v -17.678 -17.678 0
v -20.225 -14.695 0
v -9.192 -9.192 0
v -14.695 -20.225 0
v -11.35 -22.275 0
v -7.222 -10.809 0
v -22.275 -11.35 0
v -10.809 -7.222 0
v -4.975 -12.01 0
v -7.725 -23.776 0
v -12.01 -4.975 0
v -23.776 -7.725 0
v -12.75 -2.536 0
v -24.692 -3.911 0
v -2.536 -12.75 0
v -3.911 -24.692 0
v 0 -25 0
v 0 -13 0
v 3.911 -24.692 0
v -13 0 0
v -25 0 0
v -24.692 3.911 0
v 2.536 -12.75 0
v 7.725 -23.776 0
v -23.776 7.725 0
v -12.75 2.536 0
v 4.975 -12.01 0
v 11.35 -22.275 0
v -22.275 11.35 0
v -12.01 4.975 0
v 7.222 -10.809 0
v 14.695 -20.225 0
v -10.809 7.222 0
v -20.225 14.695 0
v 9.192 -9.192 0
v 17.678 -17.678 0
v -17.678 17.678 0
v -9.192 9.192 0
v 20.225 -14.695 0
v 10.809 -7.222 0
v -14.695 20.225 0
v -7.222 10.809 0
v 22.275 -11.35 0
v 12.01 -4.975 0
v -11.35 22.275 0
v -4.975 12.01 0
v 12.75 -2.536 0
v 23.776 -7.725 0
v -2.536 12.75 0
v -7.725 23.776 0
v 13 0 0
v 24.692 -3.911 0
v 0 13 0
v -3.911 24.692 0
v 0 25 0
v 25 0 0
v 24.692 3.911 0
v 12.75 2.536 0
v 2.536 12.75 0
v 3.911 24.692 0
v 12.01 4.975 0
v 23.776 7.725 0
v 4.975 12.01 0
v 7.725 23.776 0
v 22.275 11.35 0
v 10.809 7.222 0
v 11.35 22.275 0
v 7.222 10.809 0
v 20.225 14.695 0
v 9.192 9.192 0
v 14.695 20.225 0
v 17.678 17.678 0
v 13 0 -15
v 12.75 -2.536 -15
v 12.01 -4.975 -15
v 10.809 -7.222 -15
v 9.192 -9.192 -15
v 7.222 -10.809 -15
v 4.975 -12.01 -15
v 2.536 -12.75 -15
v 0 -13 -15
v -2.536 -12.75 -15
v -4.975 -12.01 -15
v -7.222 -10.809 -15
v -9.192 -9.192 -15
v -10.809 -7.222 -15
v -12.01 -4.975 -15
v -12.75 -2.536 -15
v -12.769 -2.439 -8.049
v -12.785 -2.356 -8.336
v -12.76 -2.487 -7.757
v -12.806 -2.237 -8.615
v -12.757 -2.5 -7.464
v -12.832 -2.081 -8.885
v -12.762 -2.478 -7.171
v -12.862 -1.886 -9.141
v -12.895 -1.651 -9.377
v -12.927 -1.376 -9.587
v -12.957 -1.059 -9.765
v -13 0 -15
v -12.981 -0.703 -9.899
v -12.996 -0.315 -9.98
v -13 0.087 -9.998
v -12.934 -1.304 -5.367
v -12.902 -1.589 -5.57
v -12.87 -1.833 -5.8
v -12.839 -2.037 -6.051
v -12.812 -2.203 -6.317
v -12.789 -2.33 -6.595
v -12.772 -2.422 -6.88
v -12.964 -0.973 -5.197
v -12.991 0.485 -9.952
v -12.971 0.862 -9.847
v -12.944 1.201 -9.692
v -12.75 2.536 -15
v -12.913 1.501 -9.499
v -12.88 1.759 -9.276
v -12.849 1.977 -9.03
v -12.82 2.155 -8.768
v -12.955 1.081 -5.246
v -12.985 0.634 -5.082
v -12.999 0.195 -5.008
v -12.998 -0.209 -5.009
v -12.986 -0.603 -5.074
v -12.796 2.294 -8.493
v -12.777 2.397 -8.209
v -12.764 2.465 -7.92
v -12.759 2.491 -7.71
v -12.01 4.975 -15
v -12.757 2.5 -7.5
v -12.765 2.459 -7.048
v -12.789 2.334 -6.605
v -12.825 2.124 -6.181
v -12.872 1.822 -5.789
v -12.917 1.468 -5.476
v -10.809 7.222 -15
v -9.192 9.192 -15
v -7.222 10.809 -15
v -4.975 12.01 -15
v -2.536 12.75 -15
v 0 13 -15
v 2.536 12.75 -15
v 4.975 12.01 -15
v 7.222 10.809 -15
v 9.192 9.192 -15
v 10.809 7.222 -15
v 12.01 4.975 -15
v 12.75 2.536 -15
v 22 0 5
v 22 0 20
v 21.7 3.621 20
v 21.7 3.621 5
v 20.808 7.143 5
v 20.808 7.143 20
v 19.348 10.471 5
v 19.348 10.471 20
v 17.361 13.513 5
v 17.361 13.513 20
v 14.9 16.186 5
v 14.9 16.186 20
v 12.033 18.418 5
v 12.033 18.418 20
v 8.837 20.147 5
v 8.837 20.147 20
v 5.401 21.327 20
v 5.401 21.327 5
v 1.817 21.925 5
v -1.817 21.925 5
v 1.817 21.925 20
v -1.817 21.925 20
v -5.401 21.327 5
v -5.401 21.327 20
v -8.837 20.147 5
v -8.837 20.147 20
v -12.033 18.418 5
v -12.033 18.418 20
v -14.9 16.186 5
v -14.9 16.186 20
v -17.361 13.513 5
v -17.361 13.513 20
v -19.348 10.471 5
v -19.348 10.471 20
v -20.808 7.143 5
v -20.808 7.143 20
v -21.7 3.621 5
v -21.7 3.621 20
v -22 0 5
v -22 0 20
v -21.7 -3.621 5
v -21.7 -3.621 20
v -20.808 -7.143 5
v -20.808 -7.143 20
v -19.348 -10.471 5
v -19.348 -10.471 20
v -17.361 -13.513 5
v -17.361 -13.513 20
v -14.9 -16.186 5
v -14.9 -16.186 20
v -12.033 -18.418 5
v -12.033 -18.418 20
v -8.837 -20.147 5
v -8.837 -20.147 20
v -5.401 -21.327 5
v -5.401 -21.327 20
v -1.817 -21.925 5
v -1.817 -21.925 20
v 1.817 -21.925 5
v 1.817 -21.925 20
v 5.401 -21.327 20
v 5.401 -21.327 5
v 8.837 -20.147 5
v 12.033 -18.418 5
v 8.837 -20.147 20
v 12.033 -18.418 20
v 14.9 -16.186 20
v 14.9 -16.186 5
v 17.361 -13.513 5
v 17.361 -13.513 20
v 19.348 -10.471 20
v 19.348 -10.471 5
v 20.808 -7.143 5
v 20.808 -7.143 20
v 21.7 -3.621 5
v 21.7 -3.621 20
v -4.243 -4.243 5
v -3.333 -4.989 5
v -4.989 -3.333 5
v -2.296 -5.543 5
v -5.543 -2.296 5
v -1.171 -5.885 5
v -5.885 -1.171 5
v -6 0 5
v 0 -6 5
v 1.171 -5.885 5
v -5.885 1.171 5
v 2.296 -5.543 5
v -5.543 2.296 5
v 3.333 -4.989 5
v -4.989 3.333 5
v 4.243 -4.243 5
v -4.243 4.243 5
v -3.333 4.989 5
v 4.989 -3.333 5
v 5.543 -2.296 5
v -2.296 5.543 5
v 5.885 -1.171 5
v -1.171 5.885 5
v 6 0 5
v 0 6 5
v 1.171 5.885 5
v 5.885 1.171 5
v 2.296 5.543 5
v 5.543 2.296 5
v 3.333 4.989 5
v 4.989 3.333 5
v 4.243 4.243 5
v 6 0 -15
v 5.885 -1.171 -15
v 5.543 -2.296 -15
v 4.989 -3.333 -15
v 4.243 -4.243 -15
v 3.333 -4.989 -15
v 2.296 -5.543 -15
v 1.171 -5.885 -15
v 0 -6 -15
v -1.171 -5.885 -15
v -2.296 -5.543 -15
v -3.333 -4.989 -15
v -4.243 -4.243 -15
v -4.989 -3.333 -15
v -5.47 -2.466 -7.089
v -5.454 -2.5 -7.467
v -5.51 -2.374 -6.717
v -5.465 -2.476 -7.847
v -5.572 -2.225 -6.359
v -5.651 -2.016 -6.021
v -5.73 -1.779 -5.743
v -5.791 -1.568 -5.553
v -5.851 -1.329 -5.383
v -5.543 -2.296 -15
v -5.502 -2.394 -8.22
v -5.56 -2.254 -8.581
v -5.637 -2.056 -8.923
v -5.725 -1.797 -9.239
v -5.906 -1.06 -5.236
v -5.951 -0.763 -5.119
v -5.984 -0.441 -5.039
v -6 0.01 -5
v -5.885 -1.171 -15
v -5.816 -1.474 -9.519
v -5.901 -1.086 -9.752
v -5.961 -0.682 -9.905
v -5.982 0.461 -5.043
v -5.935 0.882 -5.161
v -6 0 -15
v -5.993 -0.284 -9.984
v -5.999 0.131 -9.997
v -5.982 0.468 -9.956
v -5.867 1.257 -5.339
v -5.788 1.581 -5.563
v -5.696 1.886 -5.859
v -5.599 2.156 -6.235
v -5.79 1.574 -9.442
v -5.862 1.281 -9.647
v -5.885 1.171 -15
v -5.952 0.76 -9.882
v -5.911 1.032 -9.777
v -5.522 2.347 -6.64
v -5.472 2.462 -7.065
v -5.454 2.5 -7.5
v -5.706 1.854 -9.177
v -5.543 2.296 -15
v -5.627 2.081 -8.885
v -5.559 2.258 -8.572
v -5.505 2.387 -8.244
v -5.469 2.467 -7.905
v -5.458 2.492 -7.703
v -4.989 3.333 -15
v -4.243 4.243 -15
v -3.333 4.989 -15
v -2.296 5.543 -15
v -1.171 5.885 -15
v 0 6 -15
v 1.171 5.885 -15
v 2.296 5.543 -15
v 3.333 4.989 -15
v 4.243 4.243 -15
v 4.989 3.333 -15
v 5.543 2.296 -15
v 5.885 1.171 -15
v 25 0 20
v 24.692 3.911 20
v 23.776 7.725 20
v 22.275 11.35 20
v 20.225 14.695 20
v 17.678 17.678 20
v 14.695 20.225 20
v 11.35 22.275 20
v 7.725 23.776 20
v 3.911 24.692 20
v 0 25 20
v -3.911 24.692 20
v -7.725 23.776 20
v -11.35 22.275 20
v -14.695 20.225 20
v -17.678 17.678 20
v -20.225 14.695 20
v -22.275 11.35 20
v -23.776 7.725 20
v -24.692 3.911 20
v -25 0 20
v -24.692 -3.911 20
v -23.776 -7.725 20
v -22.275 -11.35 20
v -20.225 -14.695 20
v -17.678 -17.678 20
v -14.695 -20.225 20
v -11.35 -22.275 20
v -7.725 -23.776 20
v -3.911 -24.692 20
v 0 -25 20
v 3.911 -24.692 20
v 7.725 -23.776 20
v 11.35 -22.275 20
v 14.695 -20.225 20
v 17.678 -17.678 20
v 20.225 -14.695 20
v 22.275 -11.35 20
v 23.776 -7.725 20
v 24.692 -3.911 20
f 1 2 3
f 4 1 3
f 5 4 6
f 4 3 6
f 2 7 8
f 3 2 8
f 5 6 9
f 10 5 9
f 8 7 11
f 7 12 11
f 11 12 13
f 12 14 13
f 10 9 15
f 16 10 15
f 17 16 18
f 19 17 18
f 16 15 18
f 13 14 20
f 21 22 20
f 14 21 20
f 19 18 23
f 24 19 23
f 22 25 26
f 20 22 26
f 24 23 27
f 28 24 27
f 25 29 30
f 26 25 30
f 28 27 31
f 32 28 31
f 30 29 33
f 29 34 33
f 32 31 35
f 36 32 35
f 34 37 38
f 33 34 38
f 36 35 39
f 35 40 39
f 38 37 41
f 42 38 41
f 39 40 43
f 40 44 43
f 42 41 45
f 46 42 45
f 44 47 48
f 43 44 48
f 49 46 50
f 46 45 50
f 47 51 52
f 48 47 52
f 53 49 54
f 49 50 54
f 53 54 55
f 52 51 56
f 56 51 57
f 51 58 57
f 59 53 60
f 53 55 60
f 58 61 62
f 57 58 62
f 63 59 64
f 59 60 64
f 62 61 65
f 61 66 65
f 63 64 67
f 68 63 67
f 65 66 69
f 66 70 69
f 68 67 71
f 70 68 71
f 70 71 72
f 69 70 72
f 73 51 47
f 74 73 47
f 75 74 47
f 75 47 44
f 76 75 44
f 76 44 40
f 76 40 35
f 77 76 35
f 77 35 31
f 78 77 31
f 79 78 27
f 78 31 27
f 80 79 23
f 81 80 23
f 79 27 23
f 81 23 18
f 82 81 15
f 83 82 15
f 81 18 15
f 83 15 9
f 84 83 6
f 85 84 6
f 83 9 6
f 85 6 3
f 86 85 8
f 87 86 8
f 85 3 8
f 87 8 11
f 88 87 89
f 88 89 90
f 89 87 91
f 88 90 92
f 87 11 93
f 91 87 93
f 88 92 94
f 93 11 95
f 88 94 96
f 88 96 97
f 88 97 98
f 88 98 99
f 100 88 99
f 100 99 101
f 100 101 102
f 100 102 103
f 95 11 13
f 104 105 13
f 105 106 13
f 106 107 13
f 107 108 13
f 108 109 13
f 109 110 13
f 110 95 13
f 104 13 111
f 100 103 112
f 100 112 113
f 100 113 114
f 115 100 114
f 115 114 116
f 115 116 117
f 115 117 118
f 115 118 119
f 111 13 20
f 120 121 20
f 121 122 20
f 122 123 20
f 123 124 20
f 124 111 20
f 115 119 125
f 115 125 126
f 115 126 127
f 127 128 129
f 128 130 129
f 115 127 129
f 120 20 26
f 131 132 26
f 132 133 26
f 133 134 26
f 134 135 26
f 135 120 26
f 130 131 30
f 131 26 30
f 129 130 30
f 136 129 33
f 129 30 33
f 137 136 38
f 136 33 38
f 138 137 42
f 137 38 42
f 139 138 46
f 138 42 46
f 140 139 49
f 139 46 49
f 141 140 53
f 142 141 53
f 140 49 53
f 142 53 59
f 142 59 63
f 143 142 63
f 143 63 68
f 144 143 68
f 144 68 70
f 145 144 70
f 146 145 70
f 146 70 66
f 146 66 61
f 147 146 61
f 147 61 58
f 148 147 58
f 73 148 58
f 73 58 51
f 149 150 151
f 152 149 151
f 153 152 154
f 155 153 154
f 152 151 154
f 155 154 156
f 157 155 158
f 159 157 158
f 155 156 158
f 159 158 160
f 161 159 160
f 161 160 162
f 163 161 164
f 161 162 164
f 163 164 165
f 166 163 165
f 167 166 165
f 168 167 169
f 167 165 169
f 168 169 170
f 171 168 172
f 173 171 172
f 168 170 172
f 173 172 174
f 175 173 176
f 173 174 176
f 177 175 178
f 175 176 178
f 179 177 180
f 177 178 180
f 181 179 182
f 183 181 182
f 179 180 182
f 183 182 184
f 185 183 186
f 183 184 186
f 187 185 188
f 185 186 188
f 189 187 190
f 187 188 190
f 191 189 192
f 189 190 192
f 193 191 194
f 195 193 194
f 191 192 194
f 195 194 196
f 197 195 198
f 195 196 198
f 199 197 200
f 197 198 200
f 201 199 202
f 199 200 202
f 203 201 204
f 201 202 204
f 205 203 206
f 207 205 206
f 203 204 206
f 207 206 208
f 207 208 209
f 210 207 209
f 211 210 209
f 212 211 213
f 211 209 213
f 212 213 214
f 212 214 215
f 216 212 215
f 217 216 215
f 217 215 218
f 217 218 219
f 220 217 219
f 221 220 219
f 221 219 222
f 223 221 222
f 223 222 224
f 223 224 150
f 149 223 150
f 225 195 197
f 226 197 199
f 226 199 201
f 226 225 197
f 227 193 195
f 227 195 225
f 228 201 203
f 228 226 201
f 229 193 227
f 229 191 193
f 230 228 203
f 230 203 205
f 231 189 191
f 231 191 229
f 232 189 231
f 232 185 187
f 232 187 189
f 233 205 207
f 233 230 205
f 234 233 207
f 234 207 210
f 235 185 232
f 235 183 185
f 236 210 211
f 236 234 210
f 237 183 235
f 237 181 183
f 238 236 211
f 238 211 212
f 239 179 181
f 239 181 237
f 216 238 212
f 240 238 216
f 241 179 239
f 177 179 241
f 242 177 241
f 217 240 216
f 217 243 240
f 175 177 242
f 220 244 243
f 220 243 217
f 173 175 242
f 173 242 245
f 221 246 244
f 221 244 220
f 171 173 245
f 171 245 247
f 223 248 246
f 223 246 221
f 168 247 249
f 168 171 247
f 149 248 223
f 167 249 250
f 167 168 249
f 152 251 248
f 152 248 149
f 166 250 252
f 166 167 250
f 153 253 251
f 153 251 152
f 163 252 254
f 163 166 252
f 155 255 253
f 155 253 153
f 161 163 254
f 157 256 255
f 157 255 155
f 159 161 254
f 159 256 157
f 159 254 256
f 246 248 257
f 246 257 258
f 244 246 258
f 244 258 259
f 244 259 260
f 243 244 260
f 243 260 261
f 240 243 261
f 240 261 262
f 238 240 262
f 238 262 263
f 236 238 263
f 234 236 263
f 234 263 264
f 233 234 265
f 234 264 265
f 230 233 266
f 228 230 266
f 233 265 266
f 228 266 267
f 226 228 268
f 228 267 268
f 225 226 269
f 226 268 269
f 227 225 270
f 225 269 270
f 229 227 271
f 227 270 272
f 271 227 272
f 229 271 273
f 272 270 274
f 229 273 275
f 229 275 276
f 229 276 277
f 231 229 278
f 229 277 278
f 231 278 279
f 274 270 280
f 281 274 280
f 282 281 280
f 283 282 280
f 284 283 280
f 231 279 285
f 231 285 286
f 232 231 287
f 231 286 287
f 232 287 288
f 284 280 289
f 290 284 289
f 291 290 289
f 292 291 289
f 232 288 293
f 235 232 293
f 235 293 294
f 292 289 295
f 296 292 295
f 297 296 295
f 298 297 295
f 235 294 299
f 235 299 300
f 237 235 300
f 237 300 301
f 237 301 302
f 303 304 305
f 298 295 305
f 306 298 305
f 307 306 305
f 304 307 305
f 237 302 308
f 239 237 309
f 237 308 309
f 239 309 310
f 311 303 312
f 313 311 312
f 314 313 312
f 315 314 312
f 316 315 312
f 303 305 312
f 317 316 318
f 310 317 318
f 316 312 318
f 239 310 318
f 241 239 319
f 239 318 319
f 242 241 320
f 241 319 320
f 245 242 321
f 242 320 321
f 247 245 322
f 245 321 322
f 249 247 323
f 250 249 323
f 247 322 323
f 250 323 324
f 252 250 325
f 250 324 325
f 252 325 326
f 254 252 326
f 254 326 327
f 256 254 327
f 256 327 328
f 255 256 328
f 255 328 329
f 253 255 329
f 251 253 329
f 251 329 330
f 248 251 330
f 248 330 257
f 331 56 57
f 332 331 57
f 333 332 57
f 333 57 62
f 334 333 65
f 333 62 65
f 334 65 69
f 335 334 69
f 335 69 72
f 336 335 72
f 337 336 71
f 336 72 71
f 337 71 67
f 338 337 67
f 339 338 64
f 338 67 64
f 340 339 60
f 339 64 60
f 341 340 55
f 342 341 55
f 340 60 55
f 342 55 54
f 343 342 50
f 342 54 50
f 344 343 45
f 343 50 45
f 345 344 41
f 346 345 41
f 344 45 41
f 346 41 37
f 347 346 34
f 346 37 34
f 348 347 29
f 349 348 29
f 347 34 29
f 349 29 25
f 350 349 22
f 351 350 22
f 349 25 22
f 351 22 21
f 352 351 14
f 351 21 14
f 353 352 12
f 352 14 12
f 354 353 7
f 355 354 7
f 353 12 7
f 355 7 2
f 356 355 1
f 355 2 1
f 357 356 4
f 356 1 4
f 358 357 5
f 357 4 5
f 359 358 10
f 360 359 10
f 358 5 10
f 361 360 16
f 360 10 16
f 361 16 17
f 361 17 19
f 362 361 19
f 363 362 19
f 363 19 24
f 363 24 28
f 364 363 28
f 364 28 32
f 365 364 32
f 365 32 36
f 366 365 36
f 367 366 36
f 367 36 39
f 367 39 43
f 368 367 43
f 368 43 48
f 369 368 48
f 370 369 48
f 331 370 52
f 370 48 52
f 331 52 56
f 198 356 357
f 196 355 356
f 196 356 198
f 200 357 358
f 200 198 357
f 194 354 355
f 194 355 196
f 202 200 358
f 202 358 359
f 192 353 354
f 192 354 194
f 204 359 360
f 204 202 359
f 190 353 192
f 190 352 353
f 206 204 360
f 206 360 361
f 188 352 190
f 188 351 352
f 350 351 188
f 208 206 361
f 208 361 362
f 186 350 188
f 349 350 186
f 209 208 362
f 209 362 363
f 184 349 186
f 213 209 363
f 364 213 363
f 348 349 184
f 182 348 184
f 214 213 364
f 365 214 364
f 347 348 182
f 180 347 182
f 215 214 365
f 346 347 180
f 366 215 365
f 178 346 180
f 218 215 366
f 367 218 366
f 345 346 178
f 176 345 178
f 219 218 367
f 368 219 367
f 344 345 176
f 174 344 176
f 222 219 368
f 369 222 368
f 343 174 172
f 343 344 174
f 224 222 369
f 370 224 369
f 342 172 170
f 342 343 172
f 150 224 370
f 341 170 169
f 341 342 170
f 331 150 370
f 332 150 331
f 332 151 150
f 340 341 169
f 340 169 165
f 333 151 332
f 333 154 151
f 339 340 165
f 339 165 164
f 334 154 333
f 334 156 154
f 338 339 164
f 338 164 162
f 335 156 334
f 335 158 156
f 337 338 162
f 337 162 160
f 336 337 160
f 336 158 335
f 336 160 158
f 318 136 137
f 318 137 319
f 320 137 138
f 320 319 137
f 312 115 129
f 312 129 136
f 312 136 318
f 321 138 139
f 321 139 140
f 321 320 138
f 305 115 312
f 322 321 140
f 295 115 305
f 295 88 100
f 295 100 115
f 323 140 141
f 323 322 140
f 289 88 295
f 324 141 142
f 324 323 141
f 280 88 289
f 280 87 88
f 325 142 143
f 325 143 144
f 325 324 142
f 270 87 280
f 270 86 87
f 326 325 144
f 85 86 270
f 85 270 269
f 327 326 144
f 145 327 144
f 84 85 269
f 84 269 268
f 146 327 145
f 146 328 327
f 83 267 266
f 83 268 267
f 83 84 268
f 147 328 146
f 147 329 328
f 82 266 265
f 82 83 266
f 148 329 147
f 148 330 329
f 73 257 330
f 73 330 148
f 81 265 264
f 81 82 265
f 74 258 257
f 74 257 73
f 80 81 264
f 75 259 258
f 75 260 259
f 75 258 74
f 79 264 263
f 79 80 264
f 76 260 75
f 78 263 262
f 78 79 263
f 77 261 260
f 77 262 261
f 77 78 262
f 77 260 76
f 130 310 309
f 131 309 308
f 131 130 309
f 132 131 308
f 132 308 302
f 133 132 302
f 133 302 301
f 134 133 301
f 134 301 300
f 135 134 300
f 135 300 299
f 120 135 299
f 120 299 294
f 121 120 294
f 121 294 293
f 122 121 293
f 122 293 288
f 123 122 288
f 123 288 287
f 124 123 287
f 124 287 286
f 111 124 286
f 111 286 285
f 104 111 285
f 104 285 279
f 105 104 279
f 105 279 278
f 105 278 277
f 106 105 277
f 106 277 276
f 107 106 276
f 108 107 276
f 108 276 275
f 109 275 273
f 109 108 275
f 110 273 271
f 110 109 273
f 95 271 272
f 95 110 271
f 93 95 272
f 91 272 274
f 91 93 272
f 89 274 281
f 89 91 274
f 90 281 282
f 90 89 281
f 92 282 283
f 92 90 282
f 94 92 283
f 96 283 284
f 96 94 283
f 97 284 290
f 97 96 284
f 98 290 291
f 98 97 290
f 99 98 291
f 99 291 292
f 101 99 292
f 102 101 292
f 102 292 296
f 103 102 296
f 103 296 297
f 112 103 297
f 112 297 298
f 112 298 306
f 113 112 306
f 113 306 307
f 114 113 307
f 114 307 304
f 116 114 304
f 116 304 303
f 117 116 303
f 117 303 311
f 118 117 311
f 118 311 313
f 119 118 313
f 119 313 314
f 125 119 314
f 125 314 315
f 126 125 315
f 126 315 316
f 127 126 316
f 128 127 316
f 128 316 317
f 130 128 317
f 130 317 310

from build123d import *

# Parameters (mm, degrees)
F0_R      = 25
F1_DEPTH  = 20
F2_R      = 13
F3_DEPTH  = 15
F4_R      = 22
F5_DEPTH  = 15
F6_R      = 6
F7_DEPTH  = 35.001
F9_R      = 2.5
F10_DEPTH = 25


with BuildPart() as f1:
    # F0 (on Top) → F1 (new body)
    with BuildSketch(Plane.XY):
        Circle(F0_R)
    extrude(amount=F1_DEPTH)

    # F2 (on face) → F3 (join)
    with BuildSketch(Plane(origin=(0, 0, 0), x_dir=(1, 0, 0), z_dir=(0, 0, -1))):
        Circle(F2_R)
    extrude(amount=F3_DEPTH)

    # F4 (on face) → F5 (cut)
    with BuildSketch(Plane.XY.offset(20)):
        Circle(F4_R)
    extrude(amount=-F5_DEPTH, mode=Mode.SUBTRACT)

    # F6 (on face) → F7 (cut, through all)
    with BuildSketch(Plane(origin=(0, 0, -15), x_dir=(1, 0, 0), z_dir=(0, 0, -1))):
        Circle(F6_R)
    extrude(amount=-F7_DEPTH, mode=Mode.SUBTRACT)

    # F9 (on offset) → F10 (cut)
    with BuildSketch(Plane.YZ.offset(-25)):
        with Locations((0, -7.5)):
            Circle(F9_R)
    extrude(amount=F10_DEPTH, mode=Mode.SUBTRACT)


solid = f1.part
